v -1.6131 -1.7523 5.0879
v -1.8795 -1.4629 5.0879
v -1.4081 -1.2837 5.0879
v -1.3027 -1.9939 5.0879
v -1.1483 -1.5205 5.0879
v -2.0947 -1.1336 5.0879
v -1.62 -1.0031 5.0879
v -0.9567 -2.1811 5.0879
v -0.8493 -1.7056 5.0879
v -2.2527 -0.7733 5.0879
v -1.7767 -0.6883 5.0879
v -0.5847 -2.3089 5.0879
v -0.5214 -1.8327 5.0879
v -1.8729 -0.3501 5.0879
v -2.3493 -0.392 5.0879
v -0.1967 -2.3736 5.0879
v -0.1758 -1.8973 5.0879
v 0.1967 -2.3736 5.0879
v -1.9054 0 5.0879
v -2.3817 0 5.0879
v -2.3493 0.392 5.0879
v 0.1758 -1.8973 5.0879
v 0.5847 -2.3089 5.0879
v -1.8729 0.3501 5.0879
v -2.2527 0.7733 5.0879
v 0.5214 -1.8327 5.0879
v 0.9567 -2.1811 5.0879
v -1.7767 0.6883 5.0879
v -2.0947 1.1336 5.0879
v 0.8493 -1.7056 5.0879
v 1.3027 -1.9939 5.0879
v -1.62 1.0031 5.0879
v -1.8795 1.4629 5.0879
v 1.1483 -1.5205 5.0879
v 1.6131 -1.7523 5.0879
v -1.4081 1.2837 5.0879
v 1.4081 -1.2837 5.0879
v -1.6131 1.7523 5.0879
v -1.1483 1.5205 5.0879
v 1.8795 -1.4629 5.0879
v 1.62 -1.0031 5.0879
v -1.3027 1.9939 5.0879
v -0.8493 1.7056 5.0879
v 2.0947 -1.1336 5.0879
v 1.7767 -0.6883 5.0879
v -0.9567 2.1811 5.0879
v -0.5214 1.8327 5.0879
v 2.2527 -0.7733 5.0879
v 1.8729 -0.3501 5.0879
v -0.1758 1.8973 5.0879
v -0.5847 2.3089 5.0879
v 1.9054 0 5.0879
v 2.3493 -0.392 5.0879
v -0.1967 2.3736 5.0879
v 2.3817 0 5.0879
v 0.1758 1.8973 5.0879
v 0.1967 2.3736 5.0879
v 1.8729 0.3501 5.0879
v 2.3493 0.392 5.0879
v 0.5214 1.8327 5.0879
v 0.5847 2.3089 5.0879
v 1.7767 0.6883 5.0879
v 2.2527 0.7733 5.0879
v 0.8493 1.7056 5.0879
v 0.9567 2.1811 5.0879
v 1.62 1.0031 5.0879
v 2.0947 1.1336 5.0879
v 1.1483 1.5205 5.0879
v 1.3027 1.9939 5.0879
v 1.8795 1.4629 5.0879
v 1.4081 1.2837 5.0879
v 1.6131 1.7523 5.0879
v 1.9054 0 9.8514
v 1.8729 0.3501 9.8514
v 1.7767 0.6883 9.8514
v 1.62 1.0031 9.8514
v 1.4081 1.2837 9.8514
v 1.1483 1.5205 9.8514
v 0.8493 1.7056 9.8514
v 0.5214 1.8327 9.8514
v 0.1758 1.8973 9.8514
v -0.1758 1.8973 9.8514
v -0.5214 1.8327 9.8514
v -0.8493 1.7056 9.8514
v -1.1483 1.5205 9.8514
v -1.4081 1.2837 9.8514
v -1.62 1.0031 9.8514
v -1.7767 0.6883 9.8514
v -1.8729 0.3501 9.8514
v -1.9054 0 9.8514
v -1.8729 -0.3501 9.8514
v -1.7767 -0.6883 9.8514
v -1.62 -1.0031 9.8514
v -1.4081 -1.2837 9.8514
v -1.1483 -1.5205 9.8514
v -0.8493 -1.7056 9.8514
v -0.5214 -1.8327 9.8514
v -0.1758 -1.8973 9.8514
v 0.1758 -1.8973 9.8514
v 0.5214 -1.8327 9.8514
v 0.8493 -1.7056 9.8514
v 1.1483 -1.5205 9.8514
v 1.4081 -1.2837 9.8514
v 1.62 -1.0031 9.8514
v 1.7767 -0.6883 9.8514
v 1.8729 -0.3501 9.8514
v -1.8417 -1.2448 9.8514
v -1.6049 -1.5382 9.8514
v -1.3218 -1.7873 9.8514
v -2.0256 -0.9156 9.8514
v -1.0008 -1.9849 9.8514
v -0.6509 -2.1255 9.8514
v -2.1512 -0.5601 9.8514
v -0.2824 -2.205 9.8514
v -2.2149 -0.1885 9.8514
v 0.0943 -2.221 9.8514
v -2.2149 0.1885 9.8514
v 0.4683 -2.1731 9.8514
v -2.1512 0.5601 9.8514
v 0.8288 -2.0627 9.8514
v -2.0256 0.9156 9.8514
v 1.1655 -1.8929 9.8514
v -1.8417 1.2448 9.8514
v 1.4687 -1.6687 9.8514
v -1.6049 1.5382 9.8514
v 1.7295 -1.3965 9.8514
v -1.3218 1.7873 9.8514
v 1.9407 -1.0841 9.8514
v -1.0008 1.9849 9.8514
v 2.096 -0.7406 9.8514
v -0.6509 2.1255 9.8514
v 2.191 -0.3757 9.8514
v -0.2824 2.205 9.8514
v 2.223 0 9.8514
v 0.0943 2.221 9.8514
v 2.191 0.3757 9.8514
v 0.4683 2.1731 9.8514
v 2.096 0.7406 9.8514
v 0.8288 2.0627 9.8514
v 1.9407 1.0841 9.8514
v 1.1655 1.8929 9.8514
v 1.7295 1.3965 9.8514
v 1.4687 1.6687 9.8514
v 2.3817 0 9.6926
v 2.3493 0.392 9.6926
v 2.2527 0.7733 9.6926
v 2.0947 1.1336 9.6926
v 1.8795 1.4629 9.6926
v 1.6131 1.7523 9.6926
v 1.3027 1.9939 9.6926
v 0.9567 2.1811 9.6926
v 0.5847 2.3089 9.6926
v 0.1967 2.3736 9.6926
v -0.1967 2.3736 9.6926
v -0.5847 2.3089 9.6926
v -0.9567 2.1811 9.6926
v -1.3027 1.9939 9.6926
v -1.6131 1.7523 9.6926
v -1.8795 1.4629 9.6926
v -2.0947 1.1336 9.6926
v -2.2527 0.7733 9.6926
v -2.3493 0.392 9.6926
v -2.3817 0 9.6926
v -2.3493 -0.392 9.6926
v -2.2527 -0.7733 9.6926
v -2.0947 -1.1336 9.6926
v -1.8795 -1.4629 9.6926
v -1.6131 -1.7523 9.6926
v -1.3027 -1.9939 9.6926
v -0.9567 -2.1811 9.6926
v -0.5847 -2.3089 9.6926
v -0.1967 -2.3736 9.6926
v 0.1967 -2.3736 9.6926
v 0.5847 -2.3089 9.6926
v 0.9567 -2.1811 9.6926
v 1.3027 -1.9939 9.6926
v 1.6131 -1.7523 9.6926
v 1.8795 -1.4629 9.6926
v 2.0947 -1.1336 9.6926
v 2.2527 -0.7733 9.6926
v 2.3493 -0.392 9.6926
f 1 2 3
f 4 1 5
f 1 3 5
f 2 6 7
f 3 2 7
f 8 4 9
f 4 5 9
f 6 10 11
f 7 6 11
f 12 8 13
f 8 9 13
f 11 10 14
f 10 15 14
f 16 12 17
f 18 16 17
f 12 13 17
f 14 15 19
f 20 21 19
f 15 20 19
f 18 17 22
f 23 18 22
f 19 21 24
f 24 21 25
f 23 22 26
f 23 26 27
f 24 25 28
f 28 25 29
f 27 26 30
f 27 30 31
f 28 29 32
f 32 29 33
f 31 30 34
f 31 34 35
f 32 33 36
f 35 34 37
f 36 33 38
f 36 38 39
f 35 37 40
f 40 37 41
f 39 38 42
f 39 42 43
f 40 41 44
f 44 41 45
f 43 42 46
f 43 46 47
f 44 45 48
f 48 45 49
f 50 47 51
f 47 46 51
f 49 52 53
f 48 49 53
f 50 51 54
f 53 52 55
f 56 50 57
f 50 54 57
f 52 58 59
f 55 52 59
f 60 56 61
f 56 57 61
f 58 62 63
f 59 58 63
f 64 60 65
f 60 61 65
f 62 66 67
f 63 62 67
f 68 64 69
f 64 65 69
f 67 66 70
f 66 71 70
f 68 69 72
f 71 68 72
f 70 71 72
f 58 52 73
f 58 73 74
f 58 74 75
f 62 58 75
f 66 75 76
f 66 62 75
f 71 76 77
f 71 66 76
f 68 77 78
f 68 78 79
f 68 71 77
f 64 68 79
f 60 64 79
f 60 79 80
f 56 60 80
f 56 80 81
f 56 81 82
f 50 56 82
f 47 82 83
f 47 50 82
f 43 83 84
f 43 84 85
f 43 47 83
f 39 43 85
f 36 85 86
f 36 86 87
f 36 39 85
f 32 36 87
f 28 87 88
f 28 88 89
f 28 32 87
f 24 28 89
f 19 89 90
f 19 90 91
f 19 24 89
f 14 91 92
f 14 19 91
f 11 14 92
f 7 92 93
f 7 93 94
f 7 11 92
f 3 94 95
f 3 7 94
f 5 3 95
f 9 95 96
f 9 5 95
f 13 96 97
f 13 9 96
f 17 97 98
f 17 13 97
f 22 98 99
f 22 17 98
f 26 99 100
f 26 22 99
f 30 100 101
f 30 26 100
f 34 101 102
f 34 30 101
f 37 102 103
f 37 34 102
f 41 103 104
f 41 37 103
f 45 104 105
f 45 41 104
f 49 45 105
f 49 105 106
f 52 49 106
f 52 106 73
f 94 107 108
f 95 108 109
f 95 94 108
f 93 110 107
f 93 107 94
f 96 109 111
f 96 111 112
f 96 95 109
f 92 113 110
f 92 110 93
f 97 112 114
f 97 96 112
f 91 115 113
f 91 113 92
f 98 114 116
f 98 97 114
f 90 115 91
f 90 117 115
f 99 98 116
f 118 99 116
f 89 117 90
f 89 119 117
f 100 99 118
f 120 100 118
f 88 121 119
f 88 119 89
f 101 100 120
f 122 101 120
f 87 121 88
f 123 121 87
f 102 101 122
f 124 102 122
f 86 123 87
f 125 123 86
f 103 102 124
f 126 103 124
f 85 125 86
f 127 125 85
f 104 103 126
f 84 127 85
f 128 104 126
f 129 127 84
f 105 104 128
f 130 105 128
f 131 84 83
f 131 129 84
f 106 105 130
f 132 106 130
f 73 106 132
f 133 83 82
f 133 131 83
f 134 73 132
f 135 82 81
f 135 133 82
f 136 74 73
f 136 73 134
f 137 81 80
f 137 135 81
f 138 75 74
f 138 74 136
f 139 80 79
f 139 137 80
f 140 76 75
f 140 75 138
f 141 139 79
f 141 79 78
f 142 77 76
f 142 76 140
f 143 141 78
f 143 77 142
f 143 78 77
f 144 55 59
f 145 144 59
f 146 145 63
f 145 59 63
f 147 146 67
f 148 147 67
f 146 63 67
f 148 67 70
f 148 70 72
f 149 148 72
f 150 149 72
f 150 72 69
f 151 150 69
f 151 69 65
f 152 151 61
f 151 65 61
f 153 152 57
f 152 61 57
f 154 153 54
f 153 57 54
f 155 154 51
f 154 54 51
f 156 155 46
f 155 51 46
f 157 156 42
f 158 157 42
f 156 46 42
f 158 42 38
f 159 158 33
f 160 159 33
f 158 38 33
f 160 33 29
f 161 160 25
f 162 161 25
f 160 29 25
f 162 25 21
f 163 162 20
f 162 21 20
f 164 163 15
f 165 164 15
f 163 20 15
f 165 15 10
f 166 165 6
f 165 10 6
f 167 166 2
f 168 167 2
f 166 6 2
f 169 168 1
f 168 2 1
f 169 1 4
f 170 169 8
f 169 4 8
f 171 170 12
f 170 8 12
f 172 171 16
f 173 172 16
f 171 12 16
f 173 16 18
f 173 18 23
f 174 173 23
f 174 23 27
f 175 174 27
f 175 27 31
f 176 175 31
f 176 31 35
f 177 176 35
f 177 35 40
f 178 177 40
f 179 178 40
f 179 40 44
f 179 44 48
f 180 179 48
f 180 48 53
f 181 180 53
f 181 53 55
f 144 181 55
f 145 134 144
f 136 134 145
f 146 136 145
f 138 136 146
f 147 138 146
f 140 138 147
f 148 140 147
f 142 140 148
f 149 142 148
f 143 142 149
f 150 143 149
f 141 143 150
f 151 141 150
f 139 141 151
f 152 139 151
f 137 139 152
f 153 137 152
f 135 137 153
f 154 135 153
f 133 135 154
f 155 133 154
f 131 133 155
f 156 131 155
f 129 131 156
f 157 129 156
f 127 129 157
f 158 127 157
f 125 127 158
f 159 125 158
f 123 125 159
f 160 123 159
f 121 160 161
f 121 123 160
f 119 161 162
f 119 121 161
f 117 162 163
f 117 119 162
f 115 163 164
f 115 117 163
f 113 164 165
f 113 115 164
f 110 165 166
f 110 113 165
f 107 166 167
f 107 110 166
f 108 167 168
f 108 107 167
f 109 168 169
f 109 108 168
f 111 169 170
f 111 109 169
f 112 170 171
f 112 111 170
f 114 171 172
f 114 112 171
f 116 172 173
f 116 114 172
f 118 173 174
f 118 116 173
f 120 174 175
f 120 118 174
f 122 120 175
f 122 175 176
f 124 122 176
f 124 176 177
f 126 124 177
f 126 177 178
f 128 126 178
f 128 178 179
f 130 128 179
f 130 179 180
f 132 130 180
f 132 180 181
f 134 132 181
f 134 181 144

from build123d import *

# Parameters (mm, degrees)
SKETCH1_R           = 7.5
SKETCH1_R_2         = 6
BOSS_EXTRUDE1_DEPTH = 15
CHAMFER1_SIZE       = 0.5
SCALE1_SCALE        = 0.317565217


with BuildPart() as part:
    # Sketch1 → Boss-Extrude1 (new body)
    with BuildSketch(Plane.XY):
        Circle(SKETCH1_R)
        Circle(SKETCH1_R_2, mode=Mode.SUBTRACT)
    extrude(amount=BOSS_EXTRUDE1_DEPTH)

    # Chamfer1
    chamfer1_edges = [part.edges().sort_by_distance(p)[0] for p in [
        (-7.5, 0, 15),
    ]]
    chamfer(chamfer1_edges, length=CHAMFER1_SIZE)


with BuildPart() as part_1:
    # Scale1: scaled about (0, 0, 7.455475435)
    add(part.part.scale(SCALE1_SCALE).moved(Location((0, 0, 5.087875758))))


solid = part_1.part
